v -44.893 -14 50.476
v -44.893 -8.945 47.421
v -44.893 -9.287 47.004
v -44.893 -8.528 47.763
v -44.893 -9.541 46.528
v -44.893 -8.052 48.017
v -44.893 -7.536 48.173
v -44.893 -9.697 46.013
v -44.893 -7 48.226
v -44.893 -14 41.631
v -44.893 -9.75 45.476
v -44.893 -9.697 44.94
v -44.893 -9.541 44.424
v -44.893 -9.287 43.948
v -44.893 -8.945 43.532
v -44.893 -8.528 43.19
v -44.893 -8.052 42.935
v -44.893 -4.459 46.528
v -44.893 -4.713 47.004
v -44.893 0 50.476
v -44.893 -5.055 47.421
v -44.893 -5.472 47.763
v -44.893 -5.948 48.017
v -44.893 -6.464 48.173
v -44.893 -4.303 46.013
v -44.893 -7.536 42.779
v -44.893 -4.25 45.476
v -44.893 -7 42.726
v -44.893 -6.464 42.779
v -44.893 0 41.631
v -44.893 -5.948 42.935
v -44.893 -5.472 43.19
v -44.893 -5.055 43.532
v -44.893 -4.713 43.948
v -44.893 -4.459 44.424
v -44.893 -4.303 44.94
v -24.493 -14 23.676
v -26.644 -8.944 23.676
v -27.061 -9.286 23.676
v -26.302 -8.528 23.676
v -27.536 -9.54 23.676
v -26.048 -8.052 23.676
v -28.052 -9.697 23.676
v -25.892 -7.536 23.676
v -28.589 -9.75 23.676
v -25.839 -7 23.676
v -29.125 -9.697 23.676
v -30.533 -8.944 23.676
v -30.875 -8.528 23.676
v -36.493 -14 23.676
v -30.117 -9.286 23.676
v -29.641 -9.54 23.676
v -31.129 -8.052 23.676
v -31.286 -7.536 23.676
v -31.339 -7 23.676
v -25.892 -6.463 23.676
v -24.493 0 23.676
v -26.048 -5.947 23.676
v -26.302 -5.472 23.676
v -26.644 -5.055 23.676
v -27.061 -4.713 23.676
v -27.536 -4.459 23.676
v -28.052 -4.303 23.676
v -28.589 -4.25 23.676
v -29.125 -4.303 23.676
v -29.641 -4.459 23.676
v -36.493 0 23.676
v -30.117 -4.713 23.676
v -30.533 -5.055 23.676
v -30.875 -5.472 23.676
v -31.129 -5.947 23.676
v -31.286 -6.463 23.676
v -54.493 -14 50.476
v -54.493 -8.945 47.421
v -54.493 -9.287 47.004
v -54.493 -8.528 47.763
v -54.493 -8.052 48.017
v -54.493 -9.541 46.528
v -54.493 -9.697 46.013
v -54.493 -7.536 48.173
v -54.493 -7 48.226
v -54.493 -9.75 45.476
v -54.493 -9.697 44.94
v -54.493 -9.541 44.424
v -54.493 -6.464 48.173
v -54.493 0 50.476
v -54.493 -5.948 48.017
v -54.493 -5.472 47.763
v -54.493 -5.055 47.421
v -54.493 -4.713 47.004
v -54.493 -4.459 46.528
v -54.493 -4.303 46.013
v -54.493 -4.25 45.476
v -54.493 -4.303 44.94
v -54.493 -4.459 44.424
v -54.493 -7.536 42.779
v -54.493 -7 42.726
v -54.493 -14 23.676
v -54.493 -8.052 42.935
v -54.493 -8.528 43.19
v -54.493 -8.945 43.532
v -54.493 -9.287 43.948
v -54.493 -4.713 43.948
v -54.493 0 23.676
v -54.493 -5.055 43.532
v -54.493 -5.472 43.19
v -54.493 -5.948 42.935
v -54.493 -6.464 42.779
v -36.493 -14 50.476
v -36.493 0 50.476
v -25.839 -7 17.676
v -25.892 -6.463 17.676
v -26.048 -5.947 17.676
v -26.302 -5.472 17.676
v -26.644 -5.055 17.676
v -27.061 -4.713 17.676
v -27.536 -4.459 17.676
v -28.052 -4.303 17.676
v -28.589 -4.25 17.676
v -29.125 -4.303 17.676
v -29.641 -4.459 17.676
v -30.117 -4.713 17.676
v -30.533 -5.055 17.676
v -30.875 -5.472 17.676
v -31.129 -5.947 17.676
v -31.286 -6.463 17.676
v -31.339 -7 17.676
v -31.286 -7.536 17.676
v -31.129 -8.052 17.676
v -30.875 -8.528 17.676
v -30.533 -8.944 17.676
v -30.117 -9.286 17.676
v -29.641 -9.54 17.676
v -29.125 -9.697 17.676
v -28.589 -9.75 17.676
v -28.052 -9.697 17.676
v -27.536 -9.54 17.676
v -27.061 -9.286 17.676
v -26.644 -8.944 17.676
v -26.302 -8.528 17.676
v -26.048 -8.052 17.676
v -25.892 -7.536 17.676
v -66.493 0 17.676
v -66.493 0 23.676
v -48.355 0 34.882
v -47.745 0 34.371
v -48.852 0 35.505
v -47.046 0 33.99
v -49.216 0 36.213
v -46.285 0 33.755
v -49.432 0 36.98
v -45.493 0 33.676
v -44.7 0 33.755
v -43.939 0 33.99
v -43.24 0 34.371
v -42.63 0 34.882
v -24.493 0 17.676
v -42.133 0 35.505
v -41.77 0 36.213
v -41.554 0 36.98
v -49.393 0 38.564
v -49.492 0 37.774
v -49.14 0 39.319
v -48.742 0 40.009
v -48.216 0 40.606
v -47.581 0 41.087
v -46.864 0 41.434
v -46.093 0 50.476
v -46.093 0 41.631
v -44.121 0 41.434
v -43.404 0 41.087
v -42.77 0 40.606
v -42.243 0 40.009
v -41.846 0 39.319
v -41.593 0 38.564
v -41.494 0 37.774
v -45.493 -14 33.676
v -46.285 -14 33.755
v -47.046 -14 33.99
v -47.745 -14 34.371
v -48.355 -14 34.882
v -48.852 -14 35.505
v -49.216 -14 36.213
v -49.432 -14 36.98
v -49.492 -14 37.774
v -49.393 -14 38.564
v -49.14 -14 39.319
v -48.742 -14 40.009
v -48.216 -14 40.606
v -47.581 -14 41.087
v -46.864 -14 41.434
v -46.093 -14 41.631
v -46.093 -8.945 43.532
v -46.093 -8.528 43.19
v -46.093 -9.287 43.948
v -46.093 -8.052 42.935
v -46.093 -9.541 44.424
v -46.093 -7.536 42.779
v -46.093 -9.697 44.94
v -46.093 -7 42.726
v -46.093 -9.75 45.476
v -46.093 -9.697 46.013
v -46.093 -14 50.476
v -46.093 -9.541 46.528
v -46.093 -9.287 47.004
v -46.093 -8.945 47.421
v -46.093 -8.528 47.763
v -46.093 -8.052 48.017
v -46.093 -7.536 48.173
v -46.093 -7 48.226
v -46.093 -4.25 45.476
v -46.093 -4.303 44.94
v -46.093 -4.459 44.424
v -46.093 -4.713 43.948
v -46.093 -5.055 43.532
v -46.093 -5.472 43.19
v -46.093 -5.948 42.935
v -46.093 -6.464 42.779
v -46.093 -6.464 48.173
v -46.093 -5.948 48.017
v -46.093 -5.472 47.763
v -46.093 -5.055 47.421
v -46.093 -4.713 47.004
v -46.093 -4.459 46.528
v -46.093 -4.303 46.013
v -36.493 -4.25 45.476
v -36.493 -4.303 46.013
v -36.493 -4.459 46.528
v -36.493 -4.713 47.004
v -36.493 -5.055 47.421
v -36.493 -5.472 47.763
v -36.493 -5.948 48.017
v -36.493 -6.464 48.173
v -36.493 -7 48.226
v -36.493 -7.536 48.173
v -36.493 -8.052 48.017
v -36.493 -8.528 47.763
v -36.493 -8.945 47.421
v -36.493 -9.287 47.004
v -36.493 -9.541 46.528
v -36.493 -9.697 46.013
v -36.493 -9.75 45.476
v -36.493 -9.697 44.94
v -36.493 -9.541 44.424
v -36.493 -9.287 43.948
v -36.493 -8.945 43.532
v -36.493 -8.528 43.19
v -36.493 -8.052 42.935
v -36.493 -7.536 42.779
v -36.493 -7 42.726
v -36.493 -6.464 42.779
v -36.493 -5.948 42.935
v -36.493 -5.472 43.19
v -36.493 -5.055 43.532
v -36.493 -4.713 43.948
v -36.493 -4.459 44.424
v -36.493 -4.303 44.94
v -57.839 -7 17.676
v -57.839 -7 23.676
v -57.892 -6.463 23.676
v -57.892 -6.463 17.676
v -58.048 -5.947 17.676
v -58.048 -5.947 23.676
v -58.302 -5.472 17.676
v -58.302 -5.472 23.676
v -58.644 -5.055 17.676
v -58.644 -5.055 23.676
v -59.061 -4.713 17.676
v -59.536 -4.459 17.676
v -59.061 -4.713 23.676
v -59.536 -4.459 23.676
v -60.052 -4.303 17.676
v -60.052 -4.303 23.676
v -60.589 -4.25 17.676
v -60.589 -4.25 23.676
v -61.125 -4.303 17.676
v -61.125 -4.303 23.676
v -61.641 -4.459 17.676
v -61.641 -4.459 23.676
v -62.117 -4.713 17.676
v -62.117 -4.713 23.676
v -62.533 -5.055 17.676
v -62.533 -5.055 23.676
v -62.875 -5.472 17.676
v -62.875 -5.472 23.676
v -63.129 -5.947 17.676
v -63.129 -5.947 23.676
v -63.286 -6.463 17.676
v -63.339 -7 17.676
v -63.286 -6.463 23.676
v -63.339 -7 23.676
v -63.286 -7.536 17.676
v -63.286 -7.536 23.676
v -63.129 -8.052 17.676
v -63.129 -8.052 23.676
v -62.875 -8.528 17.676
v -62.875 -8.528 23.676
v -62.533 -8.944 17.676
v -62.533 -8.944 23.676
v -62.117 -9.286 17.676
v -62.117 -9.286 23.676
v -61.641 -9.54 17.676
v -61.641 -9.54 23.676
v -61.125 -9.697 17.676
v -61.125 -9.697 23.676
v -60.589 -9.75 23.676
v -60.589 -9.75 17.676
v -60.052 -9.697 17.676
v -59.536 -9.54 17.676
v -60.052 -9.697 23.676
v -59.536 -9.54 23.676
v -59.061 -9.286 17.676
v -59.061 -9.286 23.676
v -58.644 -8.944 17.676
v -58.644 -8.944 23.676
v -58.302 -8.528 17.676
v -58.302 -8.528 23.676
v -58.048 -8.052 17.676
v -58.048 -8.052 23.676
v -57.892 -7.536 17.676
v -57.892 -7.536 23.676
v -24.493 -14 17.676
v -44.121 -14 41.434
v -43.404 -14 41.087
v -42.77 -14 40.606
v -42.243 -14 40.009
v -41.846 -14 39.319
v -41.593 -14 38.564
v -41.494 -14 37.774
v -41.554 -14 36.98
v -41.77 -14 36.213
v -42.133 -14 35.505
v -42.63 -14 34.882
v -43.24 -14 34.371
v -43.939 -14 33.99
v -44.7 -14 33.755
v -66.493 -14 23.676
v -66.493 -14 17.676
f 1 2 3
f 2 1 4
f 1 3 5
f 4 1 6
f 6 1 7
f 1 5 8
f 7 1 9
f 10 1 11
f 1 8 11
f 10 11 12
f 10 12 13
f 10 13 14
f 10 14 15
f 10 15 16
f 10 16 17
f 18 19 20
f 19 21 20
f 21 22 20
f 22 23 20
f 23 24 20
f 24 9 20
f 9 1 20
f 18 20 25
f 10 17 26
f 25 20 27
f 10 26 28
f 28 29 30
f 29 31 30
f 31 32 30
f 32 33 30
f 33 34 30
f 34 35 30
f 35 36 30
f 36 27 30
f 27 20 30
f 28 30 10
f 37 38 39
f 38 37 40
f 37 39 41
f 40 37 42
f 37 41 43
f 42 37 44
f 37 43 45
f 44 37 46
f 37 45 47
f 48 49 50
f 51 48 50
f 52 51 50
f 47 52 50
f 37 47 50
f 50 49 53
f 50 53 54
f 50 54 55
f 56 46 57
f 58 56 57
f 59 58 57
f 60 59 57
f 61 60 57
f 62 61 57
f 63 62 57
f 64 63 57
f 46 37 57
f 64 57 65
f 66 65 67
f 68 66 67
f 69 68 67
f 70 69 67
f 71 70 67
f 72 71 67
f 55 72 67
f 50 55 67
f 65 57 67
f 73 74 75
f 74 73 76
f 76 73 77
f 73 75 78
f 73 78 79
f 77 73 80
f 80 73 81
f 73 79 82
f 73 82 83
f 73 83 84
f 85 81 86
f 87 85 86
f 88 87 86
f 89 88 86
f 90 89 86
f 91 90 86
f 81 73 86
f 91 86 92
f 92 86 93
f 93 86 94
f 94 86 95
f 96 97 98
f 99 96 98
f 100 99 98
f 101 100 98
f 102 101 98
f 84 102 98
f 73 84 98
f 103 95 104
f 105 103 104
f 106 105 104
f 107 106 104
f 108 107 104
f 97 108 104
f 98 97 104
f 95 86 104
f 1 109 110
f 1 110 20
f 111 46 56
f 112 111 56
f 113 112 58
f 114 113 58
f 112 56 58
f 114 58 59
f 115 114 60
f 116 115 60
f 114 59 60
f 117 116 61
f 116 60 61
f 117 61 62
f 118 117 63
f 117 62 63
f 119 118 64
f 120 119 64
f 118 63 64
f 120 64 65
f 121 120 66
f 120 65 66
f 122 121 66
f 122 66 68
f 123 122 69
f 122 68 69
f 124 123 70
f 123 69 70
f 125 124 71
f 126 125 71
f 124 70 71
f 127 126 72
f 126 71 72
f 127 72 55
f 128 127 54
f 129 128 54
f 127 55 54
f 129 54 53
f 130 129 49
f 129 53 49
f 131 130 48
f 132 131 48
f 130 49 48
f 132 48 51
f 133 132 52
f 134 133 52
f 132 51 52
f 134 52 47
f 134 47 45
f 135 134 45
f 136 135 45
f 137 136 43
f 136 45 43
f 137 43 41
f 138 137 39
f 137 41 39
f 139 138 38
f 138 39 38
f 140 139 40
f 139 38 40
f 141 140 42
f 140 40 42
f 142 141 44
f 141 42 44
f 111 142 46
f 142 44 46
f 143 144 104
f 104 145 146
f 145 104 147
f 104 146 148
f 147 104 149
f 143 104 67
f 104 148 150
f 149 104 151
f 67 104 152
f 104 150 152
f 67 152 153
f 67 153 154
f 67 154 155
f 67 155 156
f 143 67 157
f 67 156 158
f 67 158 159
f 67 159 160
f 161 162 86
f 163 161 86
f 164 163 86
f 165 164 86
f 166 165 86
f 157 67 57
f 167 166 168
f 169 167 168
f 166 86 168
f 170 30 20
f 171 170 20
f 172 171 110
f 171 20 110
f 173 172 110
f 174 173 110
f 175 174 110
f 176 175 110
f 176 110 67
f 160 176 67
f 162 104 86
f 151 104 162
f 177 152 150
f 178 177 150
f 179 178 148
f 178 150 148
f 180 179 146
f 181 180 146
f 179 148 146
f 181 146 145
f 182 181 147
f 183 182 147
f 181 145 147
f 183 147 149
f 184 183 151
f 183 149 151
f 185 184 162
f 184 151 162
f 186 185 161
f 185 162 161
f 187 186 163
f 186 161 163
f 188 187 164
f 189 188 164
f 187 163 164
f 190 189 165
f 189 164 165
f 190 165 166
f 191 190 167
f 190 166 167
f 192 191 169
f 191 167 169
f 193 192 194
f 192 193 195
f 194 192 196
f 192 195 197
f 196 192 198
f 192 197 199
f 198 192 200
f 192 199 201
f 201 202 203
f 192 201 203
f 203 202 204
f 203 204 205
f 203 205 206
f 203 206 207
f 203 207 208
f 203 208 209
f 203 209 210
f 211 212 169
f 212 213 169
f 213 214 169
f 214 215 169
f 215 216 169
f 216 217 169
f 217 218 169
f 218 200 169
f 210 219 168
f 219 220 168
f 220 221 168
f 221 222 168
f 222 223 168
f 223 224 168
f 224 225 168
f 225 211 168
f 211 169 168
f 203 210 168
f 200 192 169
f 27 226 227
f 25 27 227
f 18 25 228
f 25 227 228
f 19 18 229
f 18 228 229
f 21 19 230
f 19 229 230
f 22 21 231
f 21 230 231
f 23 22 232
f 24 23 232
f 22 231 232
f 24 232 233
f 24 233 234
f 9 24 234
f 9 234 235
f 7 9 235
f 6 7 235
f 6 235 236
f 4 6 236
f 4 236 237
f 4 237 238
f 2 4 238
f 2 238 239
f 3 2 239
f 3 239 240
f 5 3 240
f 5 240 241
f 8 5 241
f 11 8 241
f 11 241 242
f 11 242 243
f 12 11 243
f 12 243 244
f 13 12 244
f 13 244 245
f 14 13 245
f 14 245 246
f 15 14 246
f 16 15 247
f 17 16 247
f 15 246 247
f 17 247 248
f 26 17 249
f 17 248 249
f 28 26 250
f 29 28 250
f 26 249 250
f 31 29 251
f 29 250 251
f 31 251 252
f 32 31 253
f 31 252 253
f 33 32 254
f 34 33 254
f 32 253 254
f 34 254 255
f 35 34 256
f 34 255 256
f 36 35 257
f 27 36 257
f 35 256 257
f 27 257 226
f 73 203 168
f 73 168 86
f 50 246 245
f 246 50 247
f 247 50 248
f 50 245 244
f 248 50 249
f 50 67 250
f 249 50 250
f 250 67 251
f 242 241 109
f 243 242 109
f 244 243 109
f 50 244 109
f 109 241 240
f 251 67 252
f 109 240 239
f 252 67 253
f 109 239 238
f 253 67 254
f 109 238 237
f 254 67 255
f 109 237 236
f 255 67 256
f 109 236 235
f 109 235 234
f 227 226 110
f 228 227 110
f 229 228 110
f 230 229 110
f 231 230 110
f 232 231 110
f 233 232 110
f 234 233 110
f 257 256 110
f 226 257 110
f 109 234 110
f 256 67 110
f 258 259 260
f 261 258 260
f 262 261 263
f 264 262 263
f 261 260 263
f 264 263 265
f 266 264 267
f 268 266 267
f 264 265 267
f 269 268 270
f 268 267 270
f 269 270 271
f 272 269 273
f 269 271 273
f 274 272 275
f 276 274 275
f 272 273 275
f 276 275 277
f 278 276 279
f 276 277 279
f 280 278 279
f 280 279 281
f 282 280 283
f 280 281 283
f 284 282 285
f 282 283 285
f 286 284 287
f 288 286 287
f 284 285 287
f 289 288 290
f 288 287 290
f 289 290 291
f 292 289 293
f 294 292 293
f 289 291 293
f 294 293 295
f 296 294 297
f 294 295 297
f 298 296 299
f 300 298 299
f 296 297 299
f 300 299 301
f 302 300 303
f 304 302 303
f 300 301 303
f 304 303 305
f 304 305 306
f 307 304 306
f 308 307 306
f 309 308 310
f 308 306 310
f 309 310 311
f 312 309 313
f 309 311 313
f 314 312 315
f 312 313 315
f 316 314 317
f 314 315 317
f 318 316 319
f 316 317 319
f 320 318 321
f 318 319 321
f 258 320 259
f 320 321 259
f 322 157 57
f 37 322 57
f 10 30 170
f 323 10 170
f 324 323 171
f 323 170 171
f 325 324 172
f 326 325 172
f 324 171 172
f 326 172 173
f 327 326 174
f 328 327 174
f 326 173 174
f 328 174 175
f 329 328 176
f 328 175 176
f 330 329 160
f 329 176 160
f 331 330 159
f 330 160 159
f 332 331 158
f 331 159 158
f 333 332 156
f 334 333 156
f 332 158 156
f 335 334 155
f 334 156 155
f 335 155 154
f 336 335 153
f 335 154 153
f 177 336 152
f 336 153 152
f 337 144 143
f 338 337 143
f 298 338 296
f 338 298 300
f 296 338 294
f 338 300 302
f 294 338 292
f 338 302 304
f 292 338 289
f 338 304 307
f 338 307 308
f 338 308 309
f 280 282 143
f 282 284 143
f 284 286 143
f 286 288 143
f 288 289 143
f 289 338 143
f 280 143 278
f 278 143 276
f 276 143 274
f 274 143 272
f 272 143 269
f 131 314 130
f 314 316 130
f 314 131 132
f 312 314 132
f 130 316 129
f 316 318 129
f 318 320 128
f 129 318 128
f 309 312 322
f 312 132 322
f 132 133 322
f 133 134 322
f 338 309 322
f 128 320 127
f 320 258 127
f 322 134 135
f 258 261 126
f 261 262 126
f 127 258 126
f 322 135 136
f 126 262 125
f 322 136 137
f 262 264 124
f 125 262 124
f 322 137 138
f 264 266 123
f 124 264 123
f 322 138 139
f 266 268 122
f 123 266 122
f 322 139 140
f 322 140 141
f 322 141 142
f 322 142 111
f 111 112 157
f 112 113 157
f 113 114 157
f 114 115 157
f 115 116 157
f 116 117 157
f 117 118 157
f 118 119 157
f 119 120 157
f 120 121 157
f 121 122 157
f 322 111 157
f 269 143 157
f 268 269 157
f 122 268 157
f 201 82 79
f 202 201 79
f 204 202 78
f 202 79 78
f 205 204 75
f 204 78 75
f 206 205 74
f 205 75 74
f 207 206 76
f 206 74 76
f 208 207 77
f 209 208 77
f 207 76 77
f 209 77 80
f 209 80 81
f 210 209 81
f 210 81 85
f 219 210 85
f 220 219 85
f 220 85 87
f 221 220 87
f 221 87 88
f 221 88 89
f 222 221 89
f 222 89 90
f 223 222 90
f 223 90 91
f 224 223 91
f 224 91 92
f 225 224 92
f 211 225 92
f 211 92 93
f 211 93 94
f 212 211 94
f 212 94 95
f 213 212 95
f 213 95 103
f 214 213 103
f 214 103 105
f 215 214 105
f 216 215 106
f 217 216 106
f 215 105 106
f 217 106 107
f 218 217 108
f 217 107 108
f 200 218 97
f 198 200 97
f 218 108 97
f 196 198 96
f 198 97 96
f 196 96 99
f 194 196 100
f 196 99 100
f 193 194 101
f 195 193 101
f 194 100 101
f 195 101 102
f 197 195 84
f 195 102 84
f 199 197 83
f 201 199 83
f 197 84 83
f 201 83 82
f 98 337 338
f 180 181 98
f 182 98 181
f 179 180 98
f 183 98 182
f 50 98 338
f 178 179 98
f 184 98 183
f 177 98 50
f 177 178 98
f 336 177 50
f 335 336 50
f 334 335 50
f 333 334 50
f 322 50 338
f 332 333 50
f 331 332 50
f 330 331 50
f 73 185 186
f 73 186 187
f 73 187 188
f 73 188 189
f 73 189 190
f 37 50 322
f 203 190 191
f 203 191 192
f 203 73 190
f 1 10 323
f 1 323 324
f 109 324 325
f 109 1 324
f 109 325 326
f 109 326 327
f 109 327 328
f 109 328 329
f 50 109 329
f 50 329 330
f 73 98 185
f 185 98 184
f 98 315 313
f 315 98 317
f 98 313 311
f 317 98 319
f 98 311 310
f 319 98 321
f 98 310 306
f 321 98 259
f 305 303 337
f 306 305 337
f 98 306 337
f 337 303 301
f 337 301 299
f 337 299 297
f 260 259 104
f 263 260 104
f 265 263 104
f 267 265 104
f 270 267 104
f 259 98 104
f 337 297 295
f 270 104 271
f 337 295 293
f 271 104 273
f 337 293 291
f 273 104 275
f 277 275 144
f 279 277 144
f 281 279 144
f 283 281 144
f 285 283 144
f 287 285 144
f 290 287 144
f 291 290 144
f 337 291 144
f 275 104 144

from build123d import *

# Parameters (mm, degrees)
F1_DEPTH = 14
F2_R     = 2.75
F3_DEPTH = 6
F4_R     = 2.75
F5_DEPTH = 9
F6_R     = 2.75
F7_DEPTH = 9


with BuildPart() as f1:
    # F0 (on Front) → F1 (new body)
    with BuildSketch(Plane.XZ):
        with BuildLine():
            Line((-66.492734, 17.676073), (-45.492734, 17.676073))
            Line((-45.492734, 17.676073), (-24.492734, 17.676073))
            Line((-24.492734, 17.676073), (-24.492734, 23.676073))
            Line((-24.492734, 23.676073), (-36.492734, 23.676073))
            Line((-36.492734, 23.676073), (-36.492734, 50.476073))
            Line((-36.492734, 50.476073), (-44.892734, 50.476073))
            Line((-44.892734, 50.476073), (-44.892734, 41.630817))
            ThreePointArc((-44.892734, 41.630817), (-41.504064, 37.375221), (-45.492734, 33.676073))
            ThreePointArc((-45.492734, 33.676073), (-49.481404, 37.375221), (-46.092734, 41.630817))
            Line((-46.092734, 41.630817), (-46.092734, 50.476073))
            Line((-46.092734, 50.476073), (-54.492734, 50.476073))
            Line((-54.492734, 50.476073), (-54.492734, 23.676073))
            Line((-54.492734, 23.676073), (-66.492734, 23.676073))
            Line((-66.492734, 23.676073), (-66.492734, 17.676073))
        make_face()
    extrude(amount=F1_DEPTH)

    # F2 (on face) → F3 (cut)
    with BuildSketch(Plane.XY.offset(23.676073)):
        with Locations((-60.588689, -6.999696)):
            Circle(F2_R)
        with Locations((-28.588689, -6.999696)):
            Circle(F2_R)
    extrude(amount=-F3_DEPTH, mode=Mode.SUBTRACT)

    # F4 (on face) → F5 (cut)
    with BuildSketch(Plane.YZ.offset(-36.492734)):
        with Locations((-7, 45.476073)):
            Circle(F4_R)
    extrude(amount=-F5_DEPTH, mode=Mode.SUBTRACT)

    # F6 (on face) → F7 (cut)
    with BuildSketch(Plane(origin=(-54.492734, 0, 0), x_dir=(0, -1, 0), z_dir=(-1, 0, 0))):
        with Locations((7, 45.476073)):
            Circle(F6_R)
    extrude(amount=-F7_DEPTH, mode=Mode.SUBTRACT)


solid = f1.part
